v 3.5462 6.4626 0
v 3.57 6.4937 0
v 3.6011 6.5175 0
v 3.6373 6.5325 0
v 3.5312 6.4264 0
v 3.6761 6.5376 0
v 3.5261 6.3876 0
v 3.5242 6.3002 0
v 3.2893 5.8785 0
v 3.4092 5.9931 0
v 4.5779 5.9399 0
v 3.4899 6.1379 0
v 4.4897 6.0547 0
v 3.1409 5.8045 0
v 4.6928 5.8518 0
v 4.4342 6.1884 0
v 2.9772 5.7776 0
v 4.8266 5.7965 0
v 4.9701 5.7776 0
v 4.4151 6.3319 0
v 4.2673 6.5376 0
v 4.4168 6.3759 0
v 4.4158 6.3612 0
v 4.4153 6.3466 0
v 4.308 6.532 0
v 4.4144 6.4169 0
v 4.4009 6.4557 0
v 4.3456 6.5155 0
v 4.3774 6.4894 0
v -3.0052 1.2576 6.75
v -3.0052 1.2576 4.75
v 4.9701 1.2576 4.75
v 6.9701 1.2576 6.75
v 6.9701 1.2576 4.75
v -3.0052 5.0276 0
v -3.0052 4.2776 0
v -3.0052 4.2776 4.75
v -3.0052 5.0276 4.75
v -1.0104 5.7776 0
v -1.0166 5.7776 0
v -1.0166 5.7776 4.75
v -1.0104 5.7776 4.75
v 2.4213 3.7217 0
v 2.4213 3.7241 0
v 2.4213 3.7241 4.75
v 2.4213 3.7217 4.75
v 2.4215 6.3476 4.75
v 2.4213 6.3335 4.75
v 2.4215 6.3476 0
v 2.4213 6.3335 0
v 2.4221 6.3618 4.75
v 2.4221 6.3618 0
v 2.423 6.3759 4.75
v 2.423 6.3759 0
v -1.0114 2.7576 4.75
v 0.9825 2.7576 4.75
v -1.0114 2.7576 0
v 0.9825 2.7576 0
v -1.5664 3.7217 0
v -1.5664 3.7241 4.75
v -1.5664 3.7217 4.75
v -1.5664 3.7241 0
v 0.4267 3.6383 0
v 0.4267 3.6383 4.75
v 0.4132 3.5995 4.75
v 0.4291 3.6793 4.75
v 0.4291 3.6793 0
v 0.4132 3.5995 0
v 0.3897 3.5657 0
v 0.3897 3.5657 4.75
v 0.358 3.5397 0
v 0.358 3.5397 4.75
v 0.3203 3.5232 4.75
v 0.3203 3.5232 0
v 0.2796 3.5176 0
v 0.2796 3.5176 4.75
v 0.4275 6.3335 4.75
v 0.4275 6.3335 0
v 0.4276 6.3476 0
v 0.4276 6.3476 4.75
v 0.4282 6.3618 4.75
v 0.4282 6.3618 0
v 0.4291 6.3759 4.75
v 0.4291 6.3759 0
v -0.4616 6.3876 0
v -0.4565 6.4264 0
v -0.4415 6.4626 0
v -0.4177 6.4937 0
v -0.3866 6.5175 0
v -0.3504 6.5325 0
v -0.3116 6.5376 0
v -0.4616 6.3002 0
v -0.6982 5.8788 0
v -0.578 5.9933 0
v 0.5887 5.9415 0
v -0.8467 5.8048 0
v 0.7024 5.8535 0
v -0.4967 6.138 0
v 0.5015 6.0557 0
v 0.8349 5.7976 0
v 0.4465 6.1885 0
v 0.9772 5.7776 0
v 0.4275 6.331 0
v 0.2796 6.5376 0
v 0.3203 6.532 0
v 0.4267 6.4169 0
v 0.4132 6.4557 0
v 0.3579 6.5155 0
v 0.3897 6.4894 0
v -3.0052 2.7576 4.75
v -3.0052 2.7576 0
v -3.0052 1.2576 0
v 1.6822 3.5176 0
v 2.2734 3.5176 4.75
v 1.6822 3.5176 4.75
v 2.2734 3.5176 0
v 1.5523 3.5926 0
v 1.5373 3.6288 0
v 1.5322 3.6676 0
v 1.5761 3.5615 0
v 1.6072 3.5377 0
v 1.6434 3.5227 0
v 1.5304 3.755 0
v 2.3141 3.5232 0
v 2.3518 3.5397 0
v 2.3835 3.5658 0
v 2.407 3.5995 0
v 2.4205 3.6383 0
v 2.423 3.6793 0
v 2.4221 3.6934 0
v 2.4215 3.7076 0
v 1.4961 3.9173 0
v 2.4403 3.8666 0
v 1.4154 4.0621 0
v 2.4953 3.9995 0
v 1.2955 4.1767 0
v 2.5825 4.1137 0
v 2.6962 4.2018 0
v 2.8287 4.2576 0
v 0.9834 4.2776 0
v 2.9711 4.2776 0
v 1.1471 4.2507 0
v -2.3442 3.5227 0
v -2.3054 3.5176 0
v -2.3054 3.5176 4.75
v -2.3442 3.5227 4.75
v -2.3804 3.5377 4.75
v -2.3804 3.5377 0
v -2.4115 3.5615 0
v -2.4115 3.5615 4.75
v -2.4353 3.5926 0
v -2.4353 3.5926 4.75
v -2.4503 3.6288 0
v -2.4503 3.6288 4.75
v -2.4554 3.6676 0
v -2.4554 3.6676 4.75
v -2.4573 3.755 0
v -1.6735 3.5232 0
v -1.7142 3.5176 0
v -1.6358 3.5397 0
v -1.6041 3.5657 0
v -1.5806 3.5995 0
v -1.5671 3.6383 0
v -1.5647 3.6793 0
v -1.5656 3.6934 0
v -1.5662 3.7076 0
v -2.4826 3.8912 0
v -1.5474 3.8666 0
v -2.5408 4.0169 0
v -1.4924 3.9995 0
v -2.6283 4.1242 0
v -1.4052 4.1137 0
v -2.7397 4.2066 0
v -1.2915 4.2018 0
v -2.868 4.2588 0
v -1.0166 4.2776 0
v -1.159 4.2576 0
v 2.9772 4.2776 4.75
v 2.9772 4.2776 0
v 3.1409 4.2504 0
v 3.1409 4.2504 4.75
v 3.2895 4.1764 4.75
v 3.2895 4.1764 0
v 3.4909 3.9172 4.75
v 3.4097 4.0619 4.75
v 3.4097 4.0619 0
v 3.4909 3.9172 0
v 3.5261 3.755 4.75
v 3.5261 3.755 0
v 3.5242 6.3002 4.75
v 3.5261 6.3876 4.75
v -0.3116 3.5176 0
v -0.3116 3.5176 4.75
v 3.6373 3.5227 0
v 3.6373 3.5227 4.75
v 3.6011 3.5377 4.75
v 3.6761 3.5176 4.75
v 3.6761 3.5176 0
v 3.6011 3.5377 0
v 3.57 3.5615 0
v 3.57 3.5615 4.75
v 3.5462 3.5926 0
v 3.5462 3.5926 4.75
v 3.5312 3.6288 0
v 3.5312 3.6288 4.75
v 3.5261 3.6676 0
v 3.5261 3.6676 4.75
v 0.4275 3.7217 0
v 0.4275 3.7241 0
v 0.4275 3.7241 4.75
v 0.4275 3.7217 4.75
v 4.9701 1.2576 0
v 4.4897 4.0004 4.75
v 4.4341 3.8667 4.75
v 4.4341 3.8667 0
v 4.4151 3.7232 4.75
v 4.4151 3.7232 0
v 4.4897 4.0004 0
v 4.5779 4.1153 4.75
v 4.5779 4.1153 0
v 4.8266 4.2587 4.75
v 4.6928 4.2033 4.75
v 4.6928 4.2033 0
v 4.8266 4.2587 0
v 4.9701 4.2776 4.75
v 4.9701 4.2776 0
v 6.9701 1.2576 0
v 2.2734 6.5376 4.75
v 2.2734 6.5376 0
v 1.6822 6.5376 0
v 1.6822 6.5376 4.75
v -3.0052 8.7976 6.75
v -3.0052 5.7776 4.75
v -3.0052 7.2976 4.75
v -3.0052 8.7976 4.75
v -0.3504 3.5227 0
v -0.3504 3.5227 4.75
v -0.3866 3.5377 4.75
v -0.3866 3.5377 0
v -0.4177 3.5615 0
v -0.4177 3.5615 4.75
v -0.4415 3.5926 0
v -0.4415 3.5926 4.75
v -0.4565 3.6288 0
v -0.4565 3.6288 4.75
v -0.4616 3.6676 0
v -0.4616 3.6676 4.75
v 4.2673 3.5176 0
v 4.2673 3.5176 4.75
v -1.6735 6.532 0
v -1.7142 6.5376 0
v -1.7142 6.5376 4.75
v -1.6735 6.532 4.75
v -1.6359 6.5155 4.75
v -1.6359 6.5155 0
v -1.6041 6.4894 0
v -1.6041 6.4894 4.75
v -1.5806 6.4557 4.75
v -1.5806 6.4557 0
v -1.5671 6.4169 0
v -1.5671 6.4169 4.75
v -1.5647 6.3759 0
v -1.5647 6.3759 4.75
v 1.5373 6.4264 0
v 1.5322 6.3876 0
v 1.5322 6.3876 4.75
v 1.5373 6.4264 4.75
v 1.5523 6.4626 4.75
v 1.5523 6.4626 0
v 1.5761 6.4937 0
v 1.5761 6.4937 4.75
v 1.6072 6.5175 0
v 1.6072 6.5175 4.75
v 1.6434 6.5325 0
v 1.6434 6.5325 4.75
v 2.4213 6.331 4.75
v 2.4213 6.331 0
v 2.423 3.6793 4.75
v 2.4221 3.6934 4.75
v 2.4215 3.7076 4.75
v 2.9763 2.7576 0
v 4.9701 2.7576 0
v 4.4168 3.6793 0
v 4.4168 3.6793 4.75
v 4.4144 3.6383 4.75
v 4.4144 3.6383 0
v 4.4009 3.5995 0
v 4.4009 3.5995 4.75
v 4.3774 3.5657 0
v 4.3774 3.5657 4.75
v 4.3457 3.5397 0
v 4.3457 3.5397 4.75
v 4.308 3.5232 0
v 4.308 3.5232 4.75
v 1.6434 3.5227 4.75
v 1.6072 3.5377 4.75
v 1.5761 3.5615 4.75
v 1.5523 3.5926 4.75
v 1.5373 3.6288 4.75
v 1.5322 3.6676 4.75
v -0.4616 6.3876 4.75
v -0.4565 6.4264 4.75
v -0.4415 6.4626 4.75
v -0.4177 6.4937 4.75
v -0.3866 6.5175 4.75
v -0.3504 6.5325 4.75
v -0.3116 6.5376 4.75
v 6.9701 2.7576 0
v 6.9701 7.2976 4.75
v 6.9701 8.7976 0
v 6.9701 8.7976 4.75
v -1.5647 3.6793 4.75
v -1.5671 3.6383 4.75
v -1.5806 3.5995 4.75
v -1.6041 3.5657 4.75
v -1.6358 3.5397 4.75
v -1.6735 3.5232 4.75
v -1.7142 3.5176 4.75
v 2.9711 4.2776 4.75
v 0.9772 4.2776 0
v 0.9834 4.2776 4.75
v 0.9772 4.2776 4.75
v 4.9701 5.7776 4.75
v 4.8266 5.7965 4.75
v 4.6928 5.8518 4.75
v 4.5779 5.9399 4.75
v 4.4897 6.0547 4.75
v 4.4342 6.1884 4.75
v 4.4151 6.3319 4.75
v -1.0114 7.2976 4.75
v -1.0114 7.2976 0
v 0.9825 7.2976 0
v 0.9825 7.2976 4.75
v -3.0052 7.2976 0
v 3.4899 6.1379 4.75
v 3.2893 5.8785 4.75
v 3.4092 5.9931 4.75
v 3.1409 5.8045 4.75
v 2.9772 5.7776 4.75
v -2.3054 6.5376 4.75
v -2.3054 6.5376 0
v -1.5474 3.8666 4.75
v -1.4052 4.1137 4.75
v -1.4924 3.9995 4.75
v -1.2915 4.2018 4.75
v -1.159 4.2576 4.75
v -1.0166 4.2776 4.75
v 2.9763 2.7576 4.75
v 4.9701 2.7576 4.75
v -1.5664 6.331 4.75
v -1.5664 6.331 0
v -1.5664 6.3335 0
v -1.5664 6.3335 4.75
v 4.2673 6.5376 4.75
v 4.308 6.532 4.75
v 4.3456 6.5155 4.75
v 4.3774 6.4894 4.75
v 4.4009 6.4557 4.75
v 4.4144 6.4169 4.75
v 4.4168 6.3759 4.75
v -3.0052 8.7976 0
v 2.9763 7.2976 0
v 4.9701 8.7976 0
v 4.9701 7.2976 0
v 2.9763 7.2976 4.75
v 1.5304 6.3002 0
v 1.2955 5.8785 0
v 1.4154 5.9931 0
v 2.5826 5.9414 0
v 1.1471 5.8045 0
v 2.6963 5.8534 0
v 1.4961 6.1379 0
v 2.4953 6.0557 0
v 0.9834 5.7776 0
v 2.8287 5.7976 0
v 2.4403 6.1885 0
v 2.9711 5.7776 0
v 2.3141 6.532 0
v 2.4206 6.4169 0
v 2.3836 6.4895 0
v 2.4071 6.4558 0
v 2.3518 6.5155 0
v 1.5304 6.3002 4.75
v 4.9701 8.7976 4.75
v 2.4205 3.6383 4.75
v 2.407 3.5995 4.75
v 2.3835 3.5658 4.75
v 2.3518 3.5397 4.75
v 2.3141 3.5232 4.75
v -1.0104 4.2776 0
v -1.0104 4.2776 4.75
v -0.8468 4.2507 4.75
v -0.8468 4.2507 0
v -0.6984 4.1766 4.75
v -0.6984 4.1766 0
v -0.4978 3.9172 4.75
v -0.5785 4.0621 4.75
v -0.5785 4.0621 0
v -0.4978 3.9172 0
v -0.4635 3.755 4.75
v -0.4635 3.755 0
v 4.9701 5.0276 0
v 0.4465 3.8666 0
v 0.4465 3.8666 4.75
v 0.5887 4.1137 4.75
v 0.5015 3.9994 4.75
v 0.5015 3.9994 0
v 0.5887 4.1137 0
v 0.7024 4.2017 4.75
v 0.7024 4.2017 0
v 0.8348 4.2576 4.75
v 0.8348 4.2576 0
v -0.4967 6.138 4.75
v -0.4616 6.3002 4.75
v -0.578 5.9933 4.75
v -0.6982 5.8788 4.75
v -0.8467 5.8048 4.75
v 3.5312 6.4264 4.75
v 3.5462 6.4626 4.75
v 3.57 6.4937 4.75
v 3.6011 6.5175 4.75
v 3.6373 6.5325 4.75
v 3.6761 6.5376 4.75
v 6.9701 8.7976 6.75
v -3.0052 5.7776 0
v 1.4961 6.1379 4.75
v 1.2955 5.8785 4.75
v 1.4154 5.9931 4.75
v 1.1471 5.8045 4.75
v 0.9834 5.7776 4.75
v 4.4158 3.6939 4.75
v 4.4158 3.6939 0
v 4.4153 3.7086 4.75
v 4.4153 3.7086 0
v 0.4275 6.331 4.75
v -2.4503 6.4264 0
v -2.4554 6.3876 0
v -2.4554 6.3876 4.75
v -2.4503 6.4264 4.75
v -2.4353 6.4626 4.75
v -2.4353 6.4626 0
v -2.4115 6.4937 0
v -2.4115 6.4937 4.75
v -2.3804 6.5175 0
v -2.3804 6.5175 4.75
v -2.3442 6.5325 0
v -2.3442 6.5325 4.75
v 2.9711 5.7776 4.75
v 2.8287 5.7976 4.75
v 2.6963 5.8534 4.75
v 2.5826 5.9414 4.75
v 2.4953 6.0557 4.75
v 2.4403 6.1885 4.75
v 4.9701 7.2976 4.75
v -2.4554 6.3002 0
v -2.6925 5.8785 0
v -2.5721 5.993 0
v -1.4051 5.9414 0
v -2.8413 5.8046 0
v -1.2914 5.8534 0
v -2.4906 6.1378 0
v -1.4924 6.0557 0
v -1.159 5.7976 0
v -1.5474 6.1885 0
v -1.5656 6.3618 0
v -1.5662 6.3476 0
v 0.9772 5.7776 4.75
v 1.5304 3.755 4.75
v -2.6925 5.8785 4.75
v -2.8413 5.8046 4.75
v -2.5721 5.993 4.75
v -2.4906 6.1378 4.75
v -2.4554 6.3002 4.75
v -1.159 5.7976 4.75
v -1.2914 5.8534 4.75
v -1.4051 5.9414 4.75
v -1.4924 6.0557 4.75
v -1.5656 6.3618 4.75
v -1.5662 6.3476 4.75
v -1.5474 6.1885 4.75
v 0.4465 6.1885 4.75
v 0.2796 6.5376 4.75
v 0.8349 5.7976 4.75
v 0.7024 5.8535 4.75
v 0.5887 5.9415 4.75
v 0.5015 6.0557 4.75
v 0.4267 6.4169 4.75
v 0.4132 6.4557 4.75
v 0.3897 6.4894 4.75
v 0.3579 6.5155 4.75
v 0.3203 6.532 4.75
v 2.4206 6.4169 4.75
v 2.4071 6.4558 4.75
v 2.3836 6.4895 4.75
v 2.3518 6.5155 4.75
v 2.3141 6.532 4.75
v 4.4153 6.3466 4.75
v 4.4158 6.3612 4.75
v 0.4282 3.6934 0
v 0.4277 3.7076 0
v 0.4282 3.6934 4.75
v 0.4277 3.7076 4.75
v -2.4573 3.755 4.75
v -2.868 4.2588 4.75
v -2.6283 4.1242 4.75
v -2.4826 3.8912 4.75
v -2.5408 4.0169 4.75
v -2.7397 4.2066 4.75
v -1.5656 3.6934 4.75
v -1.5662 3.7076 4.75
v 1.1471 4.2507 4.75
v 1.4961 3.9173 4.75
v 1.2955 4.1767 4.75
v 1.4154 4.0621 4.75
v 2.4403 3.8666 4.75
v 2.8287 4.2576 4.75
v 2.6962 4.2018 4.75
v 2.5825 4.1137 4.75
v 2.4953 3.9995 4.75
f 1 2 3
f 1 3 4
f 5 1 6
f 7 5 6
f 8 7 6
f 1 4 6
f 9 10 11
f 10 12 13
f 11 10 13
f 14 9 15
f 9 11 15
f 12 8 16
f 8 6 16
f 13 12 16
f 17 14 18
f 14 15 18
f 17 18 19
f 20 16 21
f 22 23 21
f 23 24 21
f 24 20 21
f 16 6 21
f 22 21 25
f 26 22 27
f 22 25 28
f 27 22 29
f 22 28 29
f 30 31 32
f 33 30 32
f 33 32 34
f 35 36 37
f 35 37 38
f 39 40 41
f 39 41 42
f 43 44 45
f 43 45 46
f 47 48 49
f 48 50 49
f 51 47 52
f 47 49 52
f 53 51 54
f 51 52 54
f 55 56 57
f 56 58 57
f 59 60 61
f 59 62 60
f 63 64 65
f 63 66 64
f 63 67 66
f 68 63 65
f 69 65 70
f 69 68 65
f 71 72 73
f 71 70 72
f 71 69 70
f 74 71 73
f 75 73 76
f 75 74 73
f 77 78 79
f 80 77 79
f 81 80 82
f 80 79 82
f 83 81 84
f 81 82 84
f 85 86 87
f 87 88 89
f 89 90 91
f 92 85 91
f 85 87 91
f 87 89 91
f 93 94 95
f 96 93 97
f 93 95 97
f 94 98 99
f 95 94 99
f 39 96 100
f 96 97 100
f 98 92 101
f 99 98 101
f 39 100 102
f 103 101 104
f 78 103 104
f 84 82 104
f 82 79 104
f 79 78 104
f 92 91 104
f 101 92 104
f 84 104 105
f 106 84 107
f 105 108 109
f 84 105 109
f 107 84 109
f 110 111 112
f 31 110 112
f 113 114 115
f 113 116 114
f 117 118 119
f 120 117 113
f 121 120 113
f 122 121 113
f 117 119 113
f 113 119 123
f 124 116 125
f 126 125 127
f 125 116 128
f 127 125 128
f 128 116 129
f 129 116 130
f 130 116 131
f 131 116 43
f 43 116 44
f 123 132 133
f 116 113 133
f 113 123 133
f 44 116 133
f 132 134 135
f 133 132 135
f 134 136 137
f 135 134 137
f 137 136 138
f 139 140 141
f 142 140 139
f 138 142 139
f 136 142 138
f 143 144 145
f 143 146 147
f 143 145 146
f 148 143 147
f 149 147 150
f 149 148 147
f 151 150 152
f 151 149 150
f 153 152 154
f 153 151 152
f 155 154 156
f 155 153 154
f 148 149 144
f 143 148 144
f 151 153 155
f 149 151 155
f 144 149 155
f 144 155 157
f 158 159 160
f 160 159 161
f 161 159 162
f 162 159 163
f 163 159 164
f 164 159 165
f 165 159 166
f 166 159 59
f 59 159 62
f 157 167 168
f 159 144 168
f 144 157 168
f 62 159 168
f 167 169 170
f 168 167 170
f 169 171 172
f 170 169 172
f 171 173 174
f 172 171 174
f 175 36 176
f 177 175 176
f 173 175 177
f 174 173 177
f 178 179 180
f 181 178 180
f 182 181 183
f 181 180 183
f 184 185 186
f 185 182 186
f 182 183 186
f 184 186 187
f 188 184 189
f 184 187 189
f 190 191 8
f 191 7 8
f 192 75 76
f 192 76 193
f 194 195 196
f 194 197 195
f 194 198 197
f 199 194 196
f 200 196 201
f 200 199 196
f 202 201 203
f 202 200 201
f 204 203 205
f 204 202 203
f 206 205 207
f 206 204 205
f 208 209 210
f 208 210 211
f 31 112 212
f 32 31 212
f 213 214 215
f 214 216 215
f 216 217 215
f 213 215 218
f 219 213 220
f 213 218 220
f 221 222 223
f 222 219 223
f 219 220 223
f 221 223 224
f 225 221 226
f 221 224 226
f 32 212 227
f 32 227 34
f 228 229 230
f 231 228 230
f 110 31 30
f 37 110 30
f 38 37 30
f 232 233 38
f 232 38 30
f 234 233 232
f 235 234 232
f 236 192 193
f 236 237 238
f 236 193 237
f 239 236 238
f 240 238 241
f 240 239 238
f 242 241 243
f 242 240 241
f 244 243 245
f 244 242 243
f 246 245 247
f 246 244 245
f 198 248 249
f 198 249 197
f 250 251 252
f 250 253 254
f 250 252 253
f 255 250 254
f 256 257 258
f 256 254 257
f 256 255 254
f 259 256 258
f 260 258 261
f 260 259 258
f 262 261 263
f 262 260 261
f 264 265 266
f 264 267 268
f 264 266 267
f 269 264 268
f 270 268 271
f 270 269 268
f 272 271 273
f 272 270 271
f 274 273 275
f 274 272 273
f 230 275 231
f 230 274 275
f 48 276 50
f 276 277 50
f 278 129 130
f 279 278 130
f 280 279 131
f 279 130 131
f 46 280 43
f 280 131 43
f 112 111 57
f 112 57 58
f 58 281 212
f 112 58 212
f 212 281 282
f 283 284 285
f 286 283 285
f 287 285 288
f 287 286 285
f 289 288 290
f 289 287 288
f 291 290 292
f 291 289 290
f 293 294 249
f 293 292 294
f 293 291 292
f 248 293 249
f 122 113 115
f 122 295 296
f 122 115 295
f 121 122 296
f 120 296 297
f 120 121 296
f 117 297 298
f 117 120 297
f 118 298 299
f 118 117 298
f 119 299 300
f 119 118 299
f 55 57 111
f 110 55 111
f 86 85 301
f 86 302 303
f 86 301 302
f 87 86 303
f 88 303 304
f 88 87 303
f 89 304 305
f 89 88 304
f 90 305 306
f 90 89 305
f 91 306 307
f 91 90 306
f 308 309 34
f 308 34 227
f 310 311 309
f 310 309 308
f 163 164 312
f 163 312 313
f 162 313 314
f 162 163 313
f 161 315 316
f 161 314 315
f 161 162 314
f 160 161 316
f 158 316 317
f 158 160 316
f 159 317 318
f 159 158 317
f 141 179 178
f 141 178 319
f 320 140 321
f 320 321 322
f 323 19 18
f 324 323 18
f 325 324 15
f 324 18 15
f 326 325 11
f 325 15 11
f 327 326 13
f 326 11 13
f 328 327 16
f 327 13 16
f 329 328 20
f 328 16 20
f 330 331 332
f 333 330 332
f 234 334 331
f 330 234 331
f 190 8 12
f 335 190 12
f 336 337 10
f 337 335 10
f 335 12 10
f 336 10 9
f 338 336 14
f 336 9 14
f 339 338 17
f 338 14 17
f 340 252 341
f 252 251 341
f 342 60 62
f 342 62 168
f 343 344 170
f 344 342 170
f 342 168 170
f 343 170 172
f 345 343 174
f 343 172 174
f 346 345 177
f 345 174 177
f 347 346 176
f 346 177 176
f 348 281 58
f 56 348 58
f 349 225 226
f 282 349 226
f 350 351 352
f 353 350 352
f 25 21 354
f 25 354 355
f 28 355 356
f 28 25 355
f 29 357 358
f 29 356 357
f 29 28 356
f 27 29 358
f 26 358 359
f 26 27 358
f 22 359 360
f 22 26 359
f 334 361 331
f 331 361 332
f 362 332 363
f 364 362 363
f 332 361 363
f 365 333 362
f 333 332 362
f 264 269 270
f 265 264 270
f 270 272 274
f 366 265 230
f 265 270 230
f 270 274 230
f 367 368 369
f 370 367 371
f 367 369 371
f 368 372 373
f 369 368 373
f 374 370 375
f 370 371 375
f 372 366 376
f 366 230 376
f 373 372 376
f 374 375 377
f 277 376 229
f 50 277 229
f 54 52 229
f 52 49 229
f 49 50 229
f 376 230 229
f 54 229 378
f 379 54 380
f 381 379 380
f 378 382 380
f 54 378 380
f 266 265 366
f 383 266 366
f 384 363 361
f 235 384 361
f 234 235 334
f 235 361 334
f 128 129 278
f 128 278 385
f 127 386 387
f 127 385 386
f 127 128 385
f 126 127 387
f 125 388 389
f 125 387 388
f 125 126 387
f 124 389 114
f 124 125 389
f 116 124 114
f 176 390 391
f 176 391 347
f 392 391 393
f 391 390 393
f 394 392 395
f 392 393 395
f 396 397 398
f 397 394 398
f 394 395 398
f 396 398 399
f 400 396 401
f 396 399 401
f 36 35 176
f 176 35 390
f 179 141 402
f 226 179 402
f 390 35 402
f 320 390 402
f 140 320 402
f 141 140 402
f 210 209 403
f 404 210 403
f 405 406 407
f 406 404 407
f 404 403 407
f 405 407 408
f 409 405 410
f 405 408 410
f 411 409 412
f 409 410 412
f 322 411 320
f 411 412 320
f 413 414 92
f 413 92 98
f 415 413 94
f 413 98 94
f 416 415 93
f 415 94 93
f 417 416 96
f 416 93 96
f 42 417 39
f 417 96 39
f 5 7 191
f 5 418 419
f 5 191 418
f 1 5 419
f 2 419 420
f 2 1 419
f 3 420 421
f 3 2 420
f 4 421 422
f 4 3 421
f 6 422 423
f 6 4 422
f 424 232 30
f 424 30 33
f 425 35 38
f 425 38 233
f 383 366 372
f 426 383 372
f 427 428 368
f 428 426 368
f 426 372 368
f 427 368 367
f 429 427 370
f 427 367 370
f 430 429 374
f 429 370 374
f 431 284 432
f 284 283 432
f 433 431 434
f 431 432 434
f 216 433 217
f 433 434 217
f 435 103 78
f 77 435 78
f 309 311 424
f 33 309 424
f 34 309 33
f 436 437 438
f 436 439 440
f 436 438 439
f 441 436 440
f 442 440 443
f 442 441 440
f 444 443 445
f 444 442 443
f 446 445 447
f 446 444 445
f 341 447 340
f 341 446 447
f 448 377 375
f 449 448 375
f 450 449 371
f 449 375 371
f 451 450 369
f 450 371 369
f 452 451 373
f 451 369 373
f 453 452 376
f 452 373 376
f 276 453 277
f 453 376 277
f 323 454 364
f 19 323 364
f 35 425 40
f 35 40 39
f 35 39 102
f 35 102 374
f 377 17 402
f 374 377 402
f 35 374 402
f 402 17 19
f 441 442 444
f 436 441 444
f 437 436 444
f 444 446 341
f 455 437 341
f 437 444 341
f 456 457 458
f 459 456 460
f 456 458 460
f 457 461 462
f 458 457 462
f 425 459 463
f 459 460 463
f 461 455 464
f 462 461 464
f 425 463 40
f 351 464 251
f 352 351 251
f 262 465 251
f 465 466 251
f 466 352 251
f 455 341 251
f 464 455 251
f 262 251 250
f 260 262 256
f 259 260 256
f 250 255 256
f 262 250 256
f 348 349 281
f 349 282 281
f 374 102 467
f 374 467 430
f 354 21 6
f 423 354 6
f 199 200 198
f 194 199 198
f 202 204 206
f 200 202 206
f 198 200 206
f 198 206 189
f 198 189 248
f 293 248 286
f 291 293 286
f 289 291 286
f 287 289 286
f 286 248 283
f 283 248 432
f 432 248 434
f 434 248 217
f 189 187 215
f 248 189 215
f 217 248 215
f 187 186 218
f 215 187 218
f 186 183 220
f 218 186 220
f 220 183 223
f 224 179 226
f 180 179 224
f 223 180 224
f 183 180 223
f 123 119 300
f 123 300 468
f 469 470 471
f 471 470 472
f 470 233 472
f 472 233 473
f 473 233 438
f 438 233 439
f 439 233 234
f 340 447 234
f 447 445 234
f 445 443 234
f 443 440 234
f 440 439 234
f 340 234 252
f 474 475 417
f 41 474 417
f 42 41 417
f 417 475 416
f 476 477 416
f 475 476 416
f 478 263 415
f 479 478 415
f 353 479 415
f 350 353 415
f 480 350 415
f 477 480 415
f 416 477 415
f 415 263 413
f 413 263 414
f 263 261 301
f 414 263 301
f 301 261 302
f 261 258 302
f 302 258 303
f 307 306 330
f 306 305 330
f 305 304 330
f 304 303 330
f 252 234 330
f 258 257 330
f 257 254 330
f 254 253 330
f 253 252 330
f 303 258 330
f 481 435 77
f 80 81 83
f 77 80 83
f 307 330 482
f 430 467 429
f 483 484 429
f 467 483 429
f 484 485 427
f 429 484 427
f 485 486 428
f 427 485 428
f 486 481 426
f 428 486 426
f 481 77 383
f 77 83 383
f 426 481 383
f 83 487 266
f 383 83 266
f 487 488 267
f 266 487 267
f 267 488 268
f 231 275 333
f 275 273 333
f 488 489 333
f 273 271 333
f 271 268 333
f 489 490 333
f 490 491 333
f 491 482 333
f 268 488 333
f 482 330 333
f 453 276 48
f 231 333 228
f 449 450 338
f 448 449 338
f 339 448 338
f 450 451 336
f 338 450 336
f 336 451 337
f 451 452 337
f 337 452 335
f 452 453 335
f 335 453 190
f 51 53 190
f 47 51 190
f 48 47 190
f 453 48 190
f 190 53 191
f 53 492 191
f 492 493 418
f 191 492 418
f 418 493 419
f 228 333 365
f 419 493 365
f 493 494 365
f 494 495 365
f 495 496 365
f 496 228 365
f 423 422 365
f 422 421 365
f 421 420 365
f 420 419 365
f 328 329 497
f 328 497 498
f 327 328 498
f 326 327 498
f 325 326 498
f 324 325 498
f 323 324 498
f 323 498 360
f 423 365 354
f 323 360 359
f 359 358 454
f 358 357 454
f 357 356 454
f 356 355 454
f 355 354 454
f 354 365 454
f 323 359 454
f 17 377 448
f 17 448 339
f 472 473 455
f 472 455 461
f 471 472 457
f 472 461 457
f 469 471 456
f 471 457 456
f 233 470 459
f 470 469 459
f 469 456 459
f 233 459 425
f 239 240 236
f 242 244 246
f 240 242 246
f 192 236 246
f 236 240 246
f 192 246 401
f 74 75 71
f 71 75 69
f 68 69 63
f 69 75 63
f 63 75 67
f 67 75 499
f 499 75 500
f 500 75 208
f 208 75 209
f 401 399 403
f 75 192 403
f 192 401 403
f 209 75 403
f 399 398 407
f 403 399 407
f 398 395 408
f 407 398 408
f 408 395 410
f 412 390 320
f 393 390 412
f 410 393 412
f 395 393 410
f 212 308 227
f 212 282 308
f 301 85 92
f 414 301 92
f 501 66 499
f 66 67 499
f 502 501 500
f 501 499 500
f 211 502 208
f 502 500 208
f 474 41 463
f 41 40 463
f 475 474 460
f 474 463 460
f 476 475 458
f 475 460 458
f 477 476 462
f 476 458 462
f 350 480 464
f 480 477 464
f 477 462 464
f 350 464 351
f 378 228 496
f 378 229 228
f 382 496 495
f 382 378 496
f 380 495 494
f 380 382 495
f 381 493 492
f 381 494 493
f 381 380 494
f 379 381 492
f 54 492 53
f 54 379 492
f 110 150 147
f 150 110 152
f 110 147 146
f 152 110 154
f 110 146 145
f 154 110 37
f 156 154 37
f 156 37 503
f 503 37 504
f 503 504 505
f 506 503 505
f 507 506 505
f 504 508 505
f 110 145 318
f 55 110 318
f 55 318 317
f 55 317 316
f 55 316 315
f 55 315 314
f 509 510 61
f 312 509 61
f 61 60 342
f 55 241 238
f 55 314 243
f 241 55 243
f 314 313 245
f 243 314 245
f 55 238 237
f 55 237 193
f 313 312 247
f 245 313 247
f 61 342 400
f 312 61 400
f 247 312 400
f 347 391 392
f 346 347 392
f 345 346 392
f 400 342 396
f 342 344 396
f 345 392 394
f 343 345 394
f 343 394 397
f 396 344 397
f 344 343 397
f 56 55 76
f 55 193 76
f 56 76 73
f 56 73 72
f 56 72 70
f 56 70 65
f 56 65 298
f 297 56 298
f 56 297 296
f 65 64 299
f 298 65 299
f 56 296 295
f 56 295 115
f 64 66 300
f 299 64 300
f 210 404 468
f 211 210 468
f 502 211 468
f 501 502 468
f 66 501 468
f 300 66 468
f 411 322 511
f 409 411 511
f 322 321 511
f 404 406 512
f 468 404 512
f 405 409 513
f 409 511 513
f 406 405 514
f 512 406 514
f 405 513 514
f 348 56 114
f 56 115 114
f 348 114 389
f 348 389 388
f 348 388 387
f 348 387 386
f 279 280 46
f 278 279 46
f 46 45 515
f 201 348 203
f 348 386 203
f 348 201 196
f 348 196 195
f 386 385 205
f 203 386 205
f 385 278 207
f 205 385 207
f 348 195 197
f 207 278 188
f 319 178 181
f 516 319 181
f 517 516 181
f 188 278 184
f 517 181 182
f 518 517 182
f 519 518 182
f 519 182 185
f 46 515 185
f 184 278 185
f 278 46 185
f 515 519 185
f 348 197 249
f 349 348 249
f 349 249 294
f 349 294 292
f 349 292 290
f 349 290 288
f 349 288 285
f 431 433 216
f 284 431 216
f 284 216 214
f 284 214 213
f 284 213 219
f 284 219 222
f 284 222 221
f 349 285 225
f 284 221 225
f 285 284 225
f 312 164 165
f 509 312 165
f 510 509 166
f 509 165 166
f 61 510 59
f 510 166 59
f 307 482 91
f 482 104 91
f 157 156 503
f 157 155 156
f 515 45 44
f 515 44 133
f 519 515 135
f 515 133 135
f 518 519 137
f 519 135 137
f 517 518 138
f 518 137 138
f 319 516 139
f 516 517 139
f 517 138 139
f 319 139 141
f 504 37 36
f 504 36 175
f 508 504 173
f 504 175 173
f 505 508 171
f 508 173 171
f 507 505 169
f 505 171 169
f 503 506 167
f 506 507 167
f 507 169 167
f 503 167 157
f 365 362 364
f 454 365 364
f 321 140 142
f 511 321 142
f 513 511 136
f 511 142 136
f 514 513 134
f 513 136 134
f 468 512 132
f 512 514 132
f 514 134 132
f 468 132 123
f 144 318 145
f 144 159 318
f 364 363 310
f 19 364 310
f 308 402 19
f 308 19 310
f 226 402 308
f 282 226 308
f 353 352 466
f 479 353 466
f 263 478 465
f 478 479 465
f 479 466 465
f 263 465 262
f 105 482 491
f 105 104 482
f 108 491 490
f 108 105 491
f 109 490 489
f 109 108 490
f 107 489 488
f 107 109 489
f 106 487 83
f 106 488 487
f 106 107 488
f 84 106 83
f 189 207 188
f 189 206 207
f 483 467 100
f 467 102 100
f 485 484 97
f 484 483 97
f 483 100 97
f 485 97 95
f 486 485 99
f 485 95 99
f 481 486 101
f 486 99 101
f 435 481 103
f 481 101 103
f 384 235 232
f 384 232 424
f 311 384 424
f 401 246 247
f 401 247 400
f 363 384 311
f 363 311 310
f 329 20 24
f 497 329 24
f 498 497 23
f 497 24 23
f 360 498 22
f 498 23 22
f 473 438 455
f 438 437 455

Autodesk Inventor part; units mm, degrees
ref_plane "YZ Plane" through (0, 0, 0) normal (1, 0, 0) x (0, 1, 0)
ref_plane "XZ Plane" through (0, 0, 0) normal (0, 1, 0) x (-1, 0, 0)
ref_plane "XY Plane" through (0, 0, 0) normal (0, 0, 1) x (1, 0, 0)
sketch "Эскиз1" plane through (0, 0, 0) normal (0, 0, 1) x (1, 0, 0)
  line L0 (4.9701, 7.2976) -> (4.9701, 8.7976)
  line L1 (4.9701, 8.7976) -> (-3.0052, 8.7976)
  line L2 (-3.0052, 7.2976) -> (4.9701, 7.2976)
  line L3 (-3.0052, 8.7976) -> (-3.0052, 7.2976)
  line L4 (-3.0052, 5.7776) -> (4.9701, 5.7776)
  line L5 (4.9701, 5.7776) -> (4.9701, 4.2776)
  line L6 (4.9701, 4.2776) -> (-3.0052, 4.2776)
  line L7 (-3.0052, 4.2776) -> (-3.0052, 5.7776)
  line L8 (4.9701, 5.0276) -> (-5.8657, 5.0276)
  arc A0 (-3.0052, 2.7576) -> (-2.4573, 3.2802) centre (-3.0114, 3.3126) ccw
  line L9 (-3.0052, 2.7576) -> (-3.0104, 4.0302)
  line L10 (-3.0104, 4.0302) -> (-3.0104, 4.2776)
  line L11 (-1.0104, 4.2776) -> (-1.0104, 3.8676)
  arc A1 (-1.0104, 3.8676) -> (-1.0114, 3.8676) centre (-1.0114, 3.3126) ccw
  line L12 (-1.0114, 3.8676) -> (-1.0114, 2.7576)
  arc A2 (-1.5664, 3.311) -> (-1.0114, 2.7576) centre (-1.0114, 3.3126) ccw
  line L13 (-1.5664, 3.311) -> (-1.5664, 3.3135)
  arc A3 (-1.5647, 3.3559) -> (-1.5664, 3.3135) centre (-1.0114, 3.3126) ccw
  arc A4 (-1.5647, 3.3559) -> (-1.7142, 3.5176) centre (-1.7142, 3.3676) ccw
  line L14 (-1.7142, 3.5176) -> (-2.3054, 3.5176)
  arc A5 (-2.3054, 3.5176) -> (-2.4554, 3.3676) centre (-2.3054, 3.3676) ccw
  line L15 (-2.4554, 3.3676) -> (-2.4554, 3.2802)
  line L16 (-2.4554, 3.2802) -> (-2.4573, 3.2802)
  arc A6 (-1.0114, 2.7576) -> (-0.4635, 3.2802) centre (-1.0175, 3.3126) ccw
  line L17 (-1.0114, 2.7576) -> (-1.0166, 4.0302)
  line L18 (-1.0166, 4.0302) -> (-1.0166, 4.2776)
  line L19 (0.9834, 4.2776) -> (0.9834, 3.8676)
  arc A7 (0.9834, 3.8676) -> (0.9825, 3.8676) centre (0.9825, 3.3126) ccw
  line L20 (0.9825, 3.8676) -> (0.9825, 2.7576)
  arc A8 (0.4275, 3.311) -> (0.9825, 2.7576) centre (0.9825, 3.3126) ccw
  line L21 (0.4275, 3.311) -> (0.4275, 3.3135)
  arc A9 (0.4291, 3.3559) -> (0.4275, 3.3135) centre (0.9825, 3.3126) ccw
  arc A10 (0.4291, 3.3559) -> (0.2796, 3.5176) centre (0.2796, 3.3676) ccw
  line L22 (0.2796, 3.5176) -> (-0.3116, 3.5176)
  arc A11 (-0.3116, 3.5176) -> (-0.4616, 3.3676) centre (-0.3116, 3.3676) ccw
  line L23 (-0.4616, 3.3676) -> (-0.4616, 3.2802)
  line L24 (-0.4616, 3.2802) -> (-0.4635, 3.2802)
  arc A12 (0.9825, 2.7576) -> (1.5304, 3.2802) centre (0.9763, 3.3126) ccw
  line L25 (0.9825, 2.7576) -> (0.9772, 4.0302)
  line L26 (0.9772, 4.0302) -> (0.9772, 4.2776)
  line L27 (2.9772, 4.2776) -> (2.9772, 3.8676)
  arc A13 (2.9772, 3.8676) -> (2.9763, 3.8676) centre (2.9763, 3.3126) ccw
  line L28 (2.9763, 3.8676) -> (2.9763, 2.7576)
  arc A14 (2.4213, 3.311) -> (2.9763, 2.7576) centre (2.9763, 3.3126) ccw
  line L29 (2.4213, 3.311) -> (2.4213, 3.3135)
  arc A15 (2.423, 3.3559) -> (2.4213, 3.3135) centre (2.9763, 3.3126) ccw
  arc A16 (2.423, 3.3559) -> (2.2734, 3.5176) centre (2.2734, 3.3676) ccw
  line L30 (2.2734, 3.5176) -> (1.6822, 3.5176)
  arc A17 (1.6822, 3.5176) -> (1.5322, 3.3676) centre (1.6822, 3.3676) ccw
  line L31 (1.5322, 3.3676) -> (1.5322, 3.2802)
  line L32 (1.5322, 3.2802) -> (1.5304, 3.2802)
  arc A18 (2.9763, 2.7576) -> (3.5242, 3.2802) centre (2.9701, 3.3126) ccw
  line L33 (2.9763, 2.7576) -> (2.9711, 4.0302)
  line L34 (2.9711, 4.0302) -> (2.9711, 4.2776)
  line L35 (4.9711, 4.2776) -> (4.9711, 3.8676)
  arc A19 (4.9711, 3.8676) -> (4.9701, 3.8676) centre (4.9701, 3.3126) ccw
  line L36 (4.9701, 3.8676) -> (4.9701, 2.7576)
  arc A20 (4.4151, 3.311) -> (4.9701, 2.7576) centre (4.9701, 3.3126) ccw
  line L37 (4.4151, 3.311) -> (4.4151, 3.3135)
  arc A21 (4.4168, 3.3559) -> (4.4151, 3.3135) centre (4.9701, 3.3126) ccw
  arc A22 (4.4168, 3.3559) -> (4.2673, 3.5176) centre (4.2673, 3.3676) ccw
  line L38 (4.2673, 3.5176) -> (3.6761, 3.5176)
  arc A23 (3.6761, 3.5176) -> (3.5261, 3.3676) centre (3.6761, 3.3676) ccw
  line L39 (3.5261, 3.3676) -> (3.5261, 3.2802)
  line L40 (3.5261, 3.2802) -> (3.5242, 3.2802)
  line L41 (4.9701, 2.7576) -> (-3.0052, 2.7576)
  line L42 (-3.0052, 2.7576) -> (-3.0052, 1.2576)
  line L43 (-3.0052, 1.2576) -> (4.9701, 1.2576)
  line L44 (4.9701, 1.2576) -> (4.9701, 2.7576)
  line L45 (-2.3054, 3.5176) -> (5.394, 3.5176)
  line L46 (4.9701, 3.7226) -> (4.3774, 3.7226)
  arc A24 (-0.4635, 3.755) -> (-1.0114, 4.2776) centre (-1.0175, 3.7226) ccw
  line L47 (0.9825, 4.2776) -> (0.9772, 3.005)
  line L48 (0.9825, 3.1676) -> (0.9825, 4.2776)
  line L49 (-1.0114, 4.2776) -> (-1.0166, 3.005)
  arc A25 (-2.4573, 3.755) -> (-3.0052, 4.2776) centre (-3.0114, 3.7226) ccw
  line L50 (-1.0114, 3.1676) -> (-1.0114, 4.2776)
  arc A26 (-1.5664, 3.7217) -> (-1.5647, 3.6793) centre (-1.0114, 3.7226) ccw
  line L51 (-1.5664, 3.7241) -> (-1.5664, 3.7217)
  arc A27 (-1.0114, 4.2776) -> (-1.5664, 3.7241) centre (-1.0114, 3.7226) ccw
  arc A28 (-1.7142, 3.5176) -> (-1.5647, 3.6793) centre (-1.7142, 3.6676) ccw
  arc A29 (1.5304, 3.755) -> (0.9825, 4.2776) centre (0.9763, 3.7226) ccw
  arc A30 (2.4213, 3.7217) -> (2.423, 3.6793) centre (2.9763, 3.7226) ccw
  arc A31 (2.9763, 4.2776) -> (2.4213, 3.7241) centre (2.9763, 3.7226) ccw
  line L52 (2.9763, 4.2776) -> (2.9711, 3.005)
  arc A32 (-2.4554, 3.6676) -> (-2.3054, 3.5176) centre (-2.3054, 3.6676) ccw
  line L53 (-2.4554, 3.6676) -> (-2.4554, 3.755)
  line L54 (-2.4554, 3.755) -> (-2.4573, 3.755)
  arc A33 (0.9825, 4.2776) -> (0.4275, 3.7241) centre (0.9825, 3.7226) ccw
  line L55 (0.4275, 3.7241) -> (0.4275, 3.7217)
  arc A34 (0.4275, 3.7217) -> (0.4291, 3.6793) centre (0.9825, 3.7226) ccw
  arc A35 (-0.4616, 3.6676) -> (-0.3116, 3.5176) centre (-0.3116, 3.6676) ccw
  line L56 (-0.4616, 3.755) -> (-0.4635, 3.755)
  arc A36 (0.2796, 3.5176) -> (0.4291, 3.6793) centre (0.2796, 3.6676) ccw
  line L57 (2.9763, 3.1676) -> (2.9763, 4.2776)
  line L58 (3.5261, 3.755) -> (3.5242, 3.755)
  line L59 (3.5261, 3.6676) -> (3.5261, 3.755)
  arc A37 (3.5261, 3.6676) -> (3.6761, 3.5176) centre (3.6761, 3.6676) ccw
  arc A38 (3.5242, 3.755) -> (2.9763, 4.2776) centre (2.9701, 3.7226) ccw
  arc A39 (4.9701, 4.2776) -> (4.4151, 3.7241) centre (4.9701, 3.7226) ccw
  line L60 (-0.4616, 3.6676) -> (-0.4616, 3.755)
  arc A40 (2.2734, 3.5176) -> (2.423, 3.6793) centre (2.2734, 3.6676) ccw
  line L61 (2.4213, 3.7241) -> (2.4213, 3.7217)
  line L62 (4.4151, 3.7241) -> (4.4151, 3.7217)
  arc A41 (4.4151, 3.7217) -> (4.4168, 3.6793) centre (4.9701, 3.7226) ccw
  arc A42 (1.5322, 3.6676) -> (1.6822, 3.5176) centre (1.6822, 3.6676) ccw
  line L63 (1.5322, 3.755) -> (1.5304, 3.755)
  arc A43 (4.2673, 3.5176) -> (4.4168, 3.6793) centre (4.2673, 3.6676) ccw
  line L64 (1.5322, 3.6676) -> (1.5322, 3.755)
  line L65 (4.9701, 3.3126) -> (4.3774, 3.3126)
  line L66 (4.9701, 4.2776) -> (4.9701, 5.7776)
  line L67 (4.9701, 5.7776) -> (-3.0052, 5.7776)
  line L68 (-3.0052, 5.7776) -> (-3.0052, 4.2776)
  arc A44 (-1.0114, 6.1876) -> (-1.0104, 6.1876) centre (-1.0114, 6.7426) ccw
  arc A45 (-0.4635, 6.775) -> (-1.0114, 7.2976) centre (-1.0175, 6.7426) ccw
  line L69 (0.9825, 7.2976) -> (0.9772, 6.025)
  line L70 (0.9825, 6.1876) -> (0.9825, 7.2976)
  line L71 (0.9772, 6.025) -> (0.9772, 5.7776)
  line L72 (-1.0104, 5.7776) -> (-1.0104, 6.1876)
  line L73 (-1.0114, 7.2976) -> (-1.0166, 6.025)
  line L74 (-1.0166, 6.025) -> (-1.0166, 5.7776)
  line L75 (-3.0104, 6.025) -> (-3.0104, 5.7776)
  line L76 (-3.0052, 7.2976) -> (-3.0104, 6.025)
  arc A46 (-2.4573, 6.775) -> (-3.0052, 7.2976) centre (-3.0114, 6.7426) ccw
  line L77 (-1.0114, 6.1876) -> (-1.0114, 7.2976)
  arc A47 (-1.5664, 6.7417) -> (-1.5647, 6.6993) centre (-1.0114, 6.7426) ccw
  line L78 (-1.5664, 6.7441) -> (-1.5664, 6.7417)
  arc A48 (-1.0114, 7.2976) -> (-1.5664, 6.7441) centre (-1.0114, 6.7426) ccw
  arc A49 (-1.7142, 6.5376) -> (-1.5647, 6.6993) centre (-1.7142, 6.6876) ccw
  line L79 (0.9834, 5.7776) -> (0.9834, 6.1876)
  arc A50 (0.9825, 6.1876) -> (0.9834, 6.1876) centre (0.9825, 6.7426) ccw
  arc A51 (1.5304, 6.775) -> (0.9825, 7.2976) centre (0.9763, 6.7426) ccw
  arc A52 (2.4213, 6.7417) -> (2.423, 6.6993) centre (2.9763, 6.7426) ccw
  arc A53 (2.9763, 7.2976) -> (2.4213, 6.7441) centre (2.9763, 6.7426) ccw
  line L80 (2.9763, 7.2976) -> (2.9711, 6.025)
  line L81 (2.9772, 5.7776) -> (2.9772, 6.1876)
  line L82 (2.9711, 6.025) -> (2.9711, 5.7776)
  line L83 (-1.7142, 6.5376) -> (-2.3054, 6.5376)
  arc A54 (-2.4554, 6.6876) -> (-2.3054, 6.5376) centre (-2.3054, 6.6876) ccw
  line L84 (-2.4554, 6.6876) -> (-2.4554, 6.775)
  line L85 (-2.4554, 6.775) -> (-2.4573, 6.775)
  arc A55 (0.9825, 7.2976) -> (0.4275, 6.7441) centre (0.9825, 6.7426) ccw
  line L86 (0.4275, 6.7441) -> (0.4275, 6.7417)
  arc A56 (0.4275, 6.7417) -> (0.4291, 6.6993) centre (0.9825, 6.7426) ccw
  line L87 (0.2796, 6.5376) -> (-0.3116, 6.5376)
  arc A57 (-0.4616, 6.6876) -> (-0.3116, 6.5376) centre (-0.3116, 6.6876) ccw
  line L88 (-0.4616, 6.775) -> (-0.4635, 6.775)
  arc A58 (0.2796, 6.5376) -> (0.4291, 6.6993) centre (0.2796, 6.6876) ccw
  line L89 (2.9763, 6.1876) -> (2.9763, 7.2976)
  line L90 (3.5261, 6.775) -> (3.5242, 6.775)
  line L91 (3.5261, 6.6876) -> (3.5261, 6.775)
  arc A59 (3.5261, 6.6876) -> (3.6761, 6.5376) centre (3.6761, 6.6876) ccw
  arc A60 (3.5242, 6.775) -> (2.9763, 7.2976) centre (2.9701, 6.7426) ccw
  line L92 (4.2673, 6.5376) -> (3.6761, 6.5376)
  arc A61 (4.9701, 7.2976) -> (4.4151, 6.7441) centre (4.9701, 6.7426) ccw
  line L93 (4.9711, 5.7776) -> (4.9711, 6.1876)
  line L94 (-0.4616, 6.6876) -> (-0.4616, 6.775)
  arc A62 (2.9763, 6.1876) -> (2.9772, 6.1876) centre (2.9763, 6.7426) ccw
  arc A63 (2.2734, 6.5376) -> (2.423, 6.6993) centre (2.2734, 6.6876) ccw
  line L95 (2.4213, 6.7441) -> (2.4213, 6.7417)
  line L96 (4.4151, 6.7441) -> (4.4151, 6.7417)
  arc A64 (4.4151, 6.7417) -> (4.4168, 6.6993) centre (4.9701, 6.7426) ccw
  line L97 (2.2734, 6.5376) -> (1.6822, 6.5376)
  arc A65 (1.5322, 6.6876) -> (1.6822, 6.5376) centre (1.6822, 6.6876) ccw
  line L98 (1.5322, 6.775) -> (1.5304, 6.775)
  arc A66 (4.2673, 6.5376) -> (4.4168, 6.6993) centre (4.2673, 6.6876) ccw
  arc A67 (4.9701, 6.1876) -> (4.9711, 6.1876) centre (4.9701, 6.7426) ccw
  line L99 (4.9701, 6.1876) -> (4.9701, 7.2976)
  line L100 (1.5322, 6.6876) -> (1.5322, 6.775)
  line L101 (4.9701, 7.2976) -> (-3.0052, 7.2976)
  line L102 (-3.0052, 7.2976) -> (-3.0052, 8.7976)
  line L103 (4.9701, 8.7976) -> (4.9701, 7.2976)
  line L104 (-2.3054, 6.5376) -> (5.394, 6.5376)
  line L105 (4.9701, 6.3326) -> (4.3774, 6.3326)
  line L106 (-1.5664, 6.331) -> (-1.5664, 6.3335)
  line L107 (-0.4616, 6.3002) -> (-0.4635, 6.3002)
  arc A68 (-0.3116, 6.5376) -> (-0.4616, 6.3876) centre (-0.3116, 6.3876) ccw
  arc A69 (-1.5647, 6.3759) -> (-1.5664, 6.3335) centre (-1.0114, 6.3326) ccw
  line L108 (-0.4616, 6.3876) -> (-0.4616, 6.3002)
  arc A70 (-1.0114, 5.7776) -> (-0.4635, 6.3002) centre (-1.0175, 6.3326) ccw
  arc A71 (-1.5664, 6.331) -> (-1.0114, 5.7776) centre (-1.0114, 6.3326) ccw
  arc A72 (-1.5647, 6.3759) -> (-1.7142, 6.5376) centre (-1.7142, 6.3876) ccw
  arc A73 (-2.3054, 6.5376) -> (-2.4554, 6.3876) centre (-2.3054, 6.3876) ccw
  line L109 (-2.4554, 6.3876) -> (-2.4554, 6.3002)
  line L110 (-2.4554, 6.3002) -> (-2.4573, 6.3002)
  arc A74 (-3.0052, 5.7776) -> (-2.4573, 6.3002) centre (-3.0114, 6.3326) ccw
  line L111 (0.9825, 5.7776) -> (0.9772, 7.0502)
  line L112 (0.9825, 6.8876) -> (0.9825, 5.7776)
  arc A75 (0.4291, 6.3759) -> (0.2796, 6.5376) centre (0.2796, 6.3876) ccw
  arc A76 (0.4291, 6.3759) -> (0.4275, 6.3335) centre (0.9825, 6.3326) ccw
  line L113 (0.4275, 6.331) -> (0.4275, 6.3335)
  arc A77 (0.4275, 6.331) -> (0.9825, 5.7776) centre (0.9825, 6.3326) ccw
  arc A78 (0.9825, 5.7776) -> (1.5304, 6.3002) centre (0.9763, 6.3326) ccw
  arc A79 (2.4213, 6.331) -> (2.9763, 5.7776) centre (2.9763, 6.3326) ccw
  arc A80 (2.423, 6.3759) -> (2.4213, 6.3335) centre (2.9763, 6.3326) ccw
  line L114 (1.5322, 6.3002) -> (1.5304, 6.3002)
  line L115 (1.5322, 6.3876) -> (1.5322, 6.3002)
  arc A81 (1.6822, 6.5376) -> (1.5322, 6.3876) centre (1.6822, 6.3876) ccw
  line L116 (2.4213, 6.331) -> (2.4213, 6.3335)
  arc A82 (2.423, 6.3759) -> (2.2734, 6.5376) centre (2.2734, 6.3876) ccw
  line L117 (2.9763, 5.7776) -> (2.9711, 7.0502)
  line L118 (2.9763, 6.8876) -> (2.9763, 5.7776)
  arc A83 (2.9763, 5.7776) -> (3.5242, 6.3002) centre (2.9701, 6.3326) ccw
  line L119 (3.5261, 6.3002) -> (3.5242, 6.3002)
  line L120 (3.5261, 6.3876) -> (3.5261, 6.3002)
  arc A84 (3.6761, 6.5376) -> (3.5261, 6.3876) centre (3.6761, 6.3876) ccw
  line L121 (-1.0114, 5.7776) -> (-1.0166, 7.0502)
  line L122 (-1.0114, 6.8876) -> (-1.0114, 5.7776)
  arc A85 (4.4151, 6.331) -> (4.9701, 5.7776) centre (4.9701, 6.3326) ccw
  line L123 (4.4151, 6.331) -> (4.4151, 6.3335)
  arc A86 (4.4168, 6.3759) -> (4.4151, 6.3335) centre (4.9701, 6.3326) ccw
  arc A87 (4.4168, 6.3759) -> (4.2673, 6.5376) centre (4.2673, 6.3876) ccw
  line L124 (4.9701, 6.7426) -> (4.3774, 6.7426)
  point P0 (0, 0)
  point P1 (-3.0052, 8.0476)
  point P2 (-3.0052, 5.0276)
  point P3 (4.9701, 8.0476)
  point P4 (0.4512, 3.5359)
  point P5 (-1.5427, 3.5359)
  point P6 (-3.5365, 3.5359)
  point P7 (-3.0052, 2.7576)
  point P8 (2.445, 3.5359)
  point P9 (-1.7142, 6.5376)
  point P10 (-1.0166, 5.7776)
  point P11 (-1.0104, 5.7776)
  point P12 (0.9772, 5.7776)
  point P13 (0.9834, 5.7776)
  point P14 (2.9711, 5.7776)
  point P15 (2.4213, 6.3335)
  point P16 (2.9772, 5.7776)
  point P17 (4.2673, 6.5376)
  point P18 (3.6761, 6.5376)
  point P19 (2.9772, 4.2776)
  point P20 (-3.0052, 4.2776)
  point P21 (-1.0166, 4.2776)
  point P22 (2.4213, 3.7217)
  point P23 (2.9711, 4.2776)
  point P24 (0.9834, 4.2776)
  point P25 (0.4275, 3.7217)
  point P26 (0.9772, 4.2776)
  point P27 (-1.0104, 4.2776)
  dimension "d0" = 1.5
  dimension "d10" = 0.41
extrude "Выдавливание1" add sketch "Эскиз1" along normal blind 4.75 contours L2 L3 L1 L0 | A87 A86 A85 L4 A83 L120 A84 L92 | L5 L8 L7 L4 | L5 L6 L7 L8 | L97 A82 A80 L116 A79 L4 A78 L115 A81 | A39 A41 A43 L38 A37 L59 A38 L6 | L83 A72 A69 L106 A71 L4 A74 L109 A73 | L87 A75 A76 L113 A77 L4 A70 L108 A68 | L6 A27 L51 A26 A28 L14 A32 L53 A25 | A31 L61 A30 A40 L30 A42 L64 A29 L6 | L44 L43 L42 L41 | L6 A33 L55 A34 A36 L22 A35 L60 A24
sketch "Эскиз2" plane through (4.9701, 4.2776, 0) normal (1, 0, 0) x (0, 0, -1)
  line L0 (0, -1.52) -> (0, -3.02) projected
  line L1 (-4.75, 3.02) -> (-4.75, 4.52) projected
  line L2 (0, -3.02) -> (-4.75, -3.02)
  line L3 (-4.75, -3.02) -> (-4.75, 4.52)
  line L4 (-4.75, 4.52) -> (0, 4.52)
  line L5 (0, 4.52) -> (0, -3.02)
  point P0 (0, -4.2776)
  point P1 (0, -1.52)
extrude "Выдавливание2" add sketch "Эскиз2" along normal blind 2
sketch "Эскиз3" plane through (0, 0, 4.75) normal (0, 0, 1) x (1, 0, 0)
  line L0 (-3.0052, 1.2576) -> (6.9701, 1.2576) projected
  line L1 (-3.0052, 8.7976) -> (6.9701, 8.7976) projected
  line L2 (6.9701, 1.2576) -> (-3.0052, 1.2576)
  line L3 (-3.0052, 1.2576) -> (-3.0052, 8.7976)
  line L4 (-3.0052, 8.7976) -> (6.9701, 8.7976)
  line L5 (6.9701, 8.7976) -> (6.9701, 1.2576)
  point P0 (0, 0)
  point P1 (-3.0052, 1.2576)
  point P2 (6.9701, 8.7976)
extrude "Выдавливание3" add sketch "Эскиз3" along normal blind 2
ref_plane "РабПлоскость1" through (1.9948, 5.0311, -3.25) normal (0, 0, -1) x (-1, 0, 0)
properties part number "деталь будет крепить ремень"
